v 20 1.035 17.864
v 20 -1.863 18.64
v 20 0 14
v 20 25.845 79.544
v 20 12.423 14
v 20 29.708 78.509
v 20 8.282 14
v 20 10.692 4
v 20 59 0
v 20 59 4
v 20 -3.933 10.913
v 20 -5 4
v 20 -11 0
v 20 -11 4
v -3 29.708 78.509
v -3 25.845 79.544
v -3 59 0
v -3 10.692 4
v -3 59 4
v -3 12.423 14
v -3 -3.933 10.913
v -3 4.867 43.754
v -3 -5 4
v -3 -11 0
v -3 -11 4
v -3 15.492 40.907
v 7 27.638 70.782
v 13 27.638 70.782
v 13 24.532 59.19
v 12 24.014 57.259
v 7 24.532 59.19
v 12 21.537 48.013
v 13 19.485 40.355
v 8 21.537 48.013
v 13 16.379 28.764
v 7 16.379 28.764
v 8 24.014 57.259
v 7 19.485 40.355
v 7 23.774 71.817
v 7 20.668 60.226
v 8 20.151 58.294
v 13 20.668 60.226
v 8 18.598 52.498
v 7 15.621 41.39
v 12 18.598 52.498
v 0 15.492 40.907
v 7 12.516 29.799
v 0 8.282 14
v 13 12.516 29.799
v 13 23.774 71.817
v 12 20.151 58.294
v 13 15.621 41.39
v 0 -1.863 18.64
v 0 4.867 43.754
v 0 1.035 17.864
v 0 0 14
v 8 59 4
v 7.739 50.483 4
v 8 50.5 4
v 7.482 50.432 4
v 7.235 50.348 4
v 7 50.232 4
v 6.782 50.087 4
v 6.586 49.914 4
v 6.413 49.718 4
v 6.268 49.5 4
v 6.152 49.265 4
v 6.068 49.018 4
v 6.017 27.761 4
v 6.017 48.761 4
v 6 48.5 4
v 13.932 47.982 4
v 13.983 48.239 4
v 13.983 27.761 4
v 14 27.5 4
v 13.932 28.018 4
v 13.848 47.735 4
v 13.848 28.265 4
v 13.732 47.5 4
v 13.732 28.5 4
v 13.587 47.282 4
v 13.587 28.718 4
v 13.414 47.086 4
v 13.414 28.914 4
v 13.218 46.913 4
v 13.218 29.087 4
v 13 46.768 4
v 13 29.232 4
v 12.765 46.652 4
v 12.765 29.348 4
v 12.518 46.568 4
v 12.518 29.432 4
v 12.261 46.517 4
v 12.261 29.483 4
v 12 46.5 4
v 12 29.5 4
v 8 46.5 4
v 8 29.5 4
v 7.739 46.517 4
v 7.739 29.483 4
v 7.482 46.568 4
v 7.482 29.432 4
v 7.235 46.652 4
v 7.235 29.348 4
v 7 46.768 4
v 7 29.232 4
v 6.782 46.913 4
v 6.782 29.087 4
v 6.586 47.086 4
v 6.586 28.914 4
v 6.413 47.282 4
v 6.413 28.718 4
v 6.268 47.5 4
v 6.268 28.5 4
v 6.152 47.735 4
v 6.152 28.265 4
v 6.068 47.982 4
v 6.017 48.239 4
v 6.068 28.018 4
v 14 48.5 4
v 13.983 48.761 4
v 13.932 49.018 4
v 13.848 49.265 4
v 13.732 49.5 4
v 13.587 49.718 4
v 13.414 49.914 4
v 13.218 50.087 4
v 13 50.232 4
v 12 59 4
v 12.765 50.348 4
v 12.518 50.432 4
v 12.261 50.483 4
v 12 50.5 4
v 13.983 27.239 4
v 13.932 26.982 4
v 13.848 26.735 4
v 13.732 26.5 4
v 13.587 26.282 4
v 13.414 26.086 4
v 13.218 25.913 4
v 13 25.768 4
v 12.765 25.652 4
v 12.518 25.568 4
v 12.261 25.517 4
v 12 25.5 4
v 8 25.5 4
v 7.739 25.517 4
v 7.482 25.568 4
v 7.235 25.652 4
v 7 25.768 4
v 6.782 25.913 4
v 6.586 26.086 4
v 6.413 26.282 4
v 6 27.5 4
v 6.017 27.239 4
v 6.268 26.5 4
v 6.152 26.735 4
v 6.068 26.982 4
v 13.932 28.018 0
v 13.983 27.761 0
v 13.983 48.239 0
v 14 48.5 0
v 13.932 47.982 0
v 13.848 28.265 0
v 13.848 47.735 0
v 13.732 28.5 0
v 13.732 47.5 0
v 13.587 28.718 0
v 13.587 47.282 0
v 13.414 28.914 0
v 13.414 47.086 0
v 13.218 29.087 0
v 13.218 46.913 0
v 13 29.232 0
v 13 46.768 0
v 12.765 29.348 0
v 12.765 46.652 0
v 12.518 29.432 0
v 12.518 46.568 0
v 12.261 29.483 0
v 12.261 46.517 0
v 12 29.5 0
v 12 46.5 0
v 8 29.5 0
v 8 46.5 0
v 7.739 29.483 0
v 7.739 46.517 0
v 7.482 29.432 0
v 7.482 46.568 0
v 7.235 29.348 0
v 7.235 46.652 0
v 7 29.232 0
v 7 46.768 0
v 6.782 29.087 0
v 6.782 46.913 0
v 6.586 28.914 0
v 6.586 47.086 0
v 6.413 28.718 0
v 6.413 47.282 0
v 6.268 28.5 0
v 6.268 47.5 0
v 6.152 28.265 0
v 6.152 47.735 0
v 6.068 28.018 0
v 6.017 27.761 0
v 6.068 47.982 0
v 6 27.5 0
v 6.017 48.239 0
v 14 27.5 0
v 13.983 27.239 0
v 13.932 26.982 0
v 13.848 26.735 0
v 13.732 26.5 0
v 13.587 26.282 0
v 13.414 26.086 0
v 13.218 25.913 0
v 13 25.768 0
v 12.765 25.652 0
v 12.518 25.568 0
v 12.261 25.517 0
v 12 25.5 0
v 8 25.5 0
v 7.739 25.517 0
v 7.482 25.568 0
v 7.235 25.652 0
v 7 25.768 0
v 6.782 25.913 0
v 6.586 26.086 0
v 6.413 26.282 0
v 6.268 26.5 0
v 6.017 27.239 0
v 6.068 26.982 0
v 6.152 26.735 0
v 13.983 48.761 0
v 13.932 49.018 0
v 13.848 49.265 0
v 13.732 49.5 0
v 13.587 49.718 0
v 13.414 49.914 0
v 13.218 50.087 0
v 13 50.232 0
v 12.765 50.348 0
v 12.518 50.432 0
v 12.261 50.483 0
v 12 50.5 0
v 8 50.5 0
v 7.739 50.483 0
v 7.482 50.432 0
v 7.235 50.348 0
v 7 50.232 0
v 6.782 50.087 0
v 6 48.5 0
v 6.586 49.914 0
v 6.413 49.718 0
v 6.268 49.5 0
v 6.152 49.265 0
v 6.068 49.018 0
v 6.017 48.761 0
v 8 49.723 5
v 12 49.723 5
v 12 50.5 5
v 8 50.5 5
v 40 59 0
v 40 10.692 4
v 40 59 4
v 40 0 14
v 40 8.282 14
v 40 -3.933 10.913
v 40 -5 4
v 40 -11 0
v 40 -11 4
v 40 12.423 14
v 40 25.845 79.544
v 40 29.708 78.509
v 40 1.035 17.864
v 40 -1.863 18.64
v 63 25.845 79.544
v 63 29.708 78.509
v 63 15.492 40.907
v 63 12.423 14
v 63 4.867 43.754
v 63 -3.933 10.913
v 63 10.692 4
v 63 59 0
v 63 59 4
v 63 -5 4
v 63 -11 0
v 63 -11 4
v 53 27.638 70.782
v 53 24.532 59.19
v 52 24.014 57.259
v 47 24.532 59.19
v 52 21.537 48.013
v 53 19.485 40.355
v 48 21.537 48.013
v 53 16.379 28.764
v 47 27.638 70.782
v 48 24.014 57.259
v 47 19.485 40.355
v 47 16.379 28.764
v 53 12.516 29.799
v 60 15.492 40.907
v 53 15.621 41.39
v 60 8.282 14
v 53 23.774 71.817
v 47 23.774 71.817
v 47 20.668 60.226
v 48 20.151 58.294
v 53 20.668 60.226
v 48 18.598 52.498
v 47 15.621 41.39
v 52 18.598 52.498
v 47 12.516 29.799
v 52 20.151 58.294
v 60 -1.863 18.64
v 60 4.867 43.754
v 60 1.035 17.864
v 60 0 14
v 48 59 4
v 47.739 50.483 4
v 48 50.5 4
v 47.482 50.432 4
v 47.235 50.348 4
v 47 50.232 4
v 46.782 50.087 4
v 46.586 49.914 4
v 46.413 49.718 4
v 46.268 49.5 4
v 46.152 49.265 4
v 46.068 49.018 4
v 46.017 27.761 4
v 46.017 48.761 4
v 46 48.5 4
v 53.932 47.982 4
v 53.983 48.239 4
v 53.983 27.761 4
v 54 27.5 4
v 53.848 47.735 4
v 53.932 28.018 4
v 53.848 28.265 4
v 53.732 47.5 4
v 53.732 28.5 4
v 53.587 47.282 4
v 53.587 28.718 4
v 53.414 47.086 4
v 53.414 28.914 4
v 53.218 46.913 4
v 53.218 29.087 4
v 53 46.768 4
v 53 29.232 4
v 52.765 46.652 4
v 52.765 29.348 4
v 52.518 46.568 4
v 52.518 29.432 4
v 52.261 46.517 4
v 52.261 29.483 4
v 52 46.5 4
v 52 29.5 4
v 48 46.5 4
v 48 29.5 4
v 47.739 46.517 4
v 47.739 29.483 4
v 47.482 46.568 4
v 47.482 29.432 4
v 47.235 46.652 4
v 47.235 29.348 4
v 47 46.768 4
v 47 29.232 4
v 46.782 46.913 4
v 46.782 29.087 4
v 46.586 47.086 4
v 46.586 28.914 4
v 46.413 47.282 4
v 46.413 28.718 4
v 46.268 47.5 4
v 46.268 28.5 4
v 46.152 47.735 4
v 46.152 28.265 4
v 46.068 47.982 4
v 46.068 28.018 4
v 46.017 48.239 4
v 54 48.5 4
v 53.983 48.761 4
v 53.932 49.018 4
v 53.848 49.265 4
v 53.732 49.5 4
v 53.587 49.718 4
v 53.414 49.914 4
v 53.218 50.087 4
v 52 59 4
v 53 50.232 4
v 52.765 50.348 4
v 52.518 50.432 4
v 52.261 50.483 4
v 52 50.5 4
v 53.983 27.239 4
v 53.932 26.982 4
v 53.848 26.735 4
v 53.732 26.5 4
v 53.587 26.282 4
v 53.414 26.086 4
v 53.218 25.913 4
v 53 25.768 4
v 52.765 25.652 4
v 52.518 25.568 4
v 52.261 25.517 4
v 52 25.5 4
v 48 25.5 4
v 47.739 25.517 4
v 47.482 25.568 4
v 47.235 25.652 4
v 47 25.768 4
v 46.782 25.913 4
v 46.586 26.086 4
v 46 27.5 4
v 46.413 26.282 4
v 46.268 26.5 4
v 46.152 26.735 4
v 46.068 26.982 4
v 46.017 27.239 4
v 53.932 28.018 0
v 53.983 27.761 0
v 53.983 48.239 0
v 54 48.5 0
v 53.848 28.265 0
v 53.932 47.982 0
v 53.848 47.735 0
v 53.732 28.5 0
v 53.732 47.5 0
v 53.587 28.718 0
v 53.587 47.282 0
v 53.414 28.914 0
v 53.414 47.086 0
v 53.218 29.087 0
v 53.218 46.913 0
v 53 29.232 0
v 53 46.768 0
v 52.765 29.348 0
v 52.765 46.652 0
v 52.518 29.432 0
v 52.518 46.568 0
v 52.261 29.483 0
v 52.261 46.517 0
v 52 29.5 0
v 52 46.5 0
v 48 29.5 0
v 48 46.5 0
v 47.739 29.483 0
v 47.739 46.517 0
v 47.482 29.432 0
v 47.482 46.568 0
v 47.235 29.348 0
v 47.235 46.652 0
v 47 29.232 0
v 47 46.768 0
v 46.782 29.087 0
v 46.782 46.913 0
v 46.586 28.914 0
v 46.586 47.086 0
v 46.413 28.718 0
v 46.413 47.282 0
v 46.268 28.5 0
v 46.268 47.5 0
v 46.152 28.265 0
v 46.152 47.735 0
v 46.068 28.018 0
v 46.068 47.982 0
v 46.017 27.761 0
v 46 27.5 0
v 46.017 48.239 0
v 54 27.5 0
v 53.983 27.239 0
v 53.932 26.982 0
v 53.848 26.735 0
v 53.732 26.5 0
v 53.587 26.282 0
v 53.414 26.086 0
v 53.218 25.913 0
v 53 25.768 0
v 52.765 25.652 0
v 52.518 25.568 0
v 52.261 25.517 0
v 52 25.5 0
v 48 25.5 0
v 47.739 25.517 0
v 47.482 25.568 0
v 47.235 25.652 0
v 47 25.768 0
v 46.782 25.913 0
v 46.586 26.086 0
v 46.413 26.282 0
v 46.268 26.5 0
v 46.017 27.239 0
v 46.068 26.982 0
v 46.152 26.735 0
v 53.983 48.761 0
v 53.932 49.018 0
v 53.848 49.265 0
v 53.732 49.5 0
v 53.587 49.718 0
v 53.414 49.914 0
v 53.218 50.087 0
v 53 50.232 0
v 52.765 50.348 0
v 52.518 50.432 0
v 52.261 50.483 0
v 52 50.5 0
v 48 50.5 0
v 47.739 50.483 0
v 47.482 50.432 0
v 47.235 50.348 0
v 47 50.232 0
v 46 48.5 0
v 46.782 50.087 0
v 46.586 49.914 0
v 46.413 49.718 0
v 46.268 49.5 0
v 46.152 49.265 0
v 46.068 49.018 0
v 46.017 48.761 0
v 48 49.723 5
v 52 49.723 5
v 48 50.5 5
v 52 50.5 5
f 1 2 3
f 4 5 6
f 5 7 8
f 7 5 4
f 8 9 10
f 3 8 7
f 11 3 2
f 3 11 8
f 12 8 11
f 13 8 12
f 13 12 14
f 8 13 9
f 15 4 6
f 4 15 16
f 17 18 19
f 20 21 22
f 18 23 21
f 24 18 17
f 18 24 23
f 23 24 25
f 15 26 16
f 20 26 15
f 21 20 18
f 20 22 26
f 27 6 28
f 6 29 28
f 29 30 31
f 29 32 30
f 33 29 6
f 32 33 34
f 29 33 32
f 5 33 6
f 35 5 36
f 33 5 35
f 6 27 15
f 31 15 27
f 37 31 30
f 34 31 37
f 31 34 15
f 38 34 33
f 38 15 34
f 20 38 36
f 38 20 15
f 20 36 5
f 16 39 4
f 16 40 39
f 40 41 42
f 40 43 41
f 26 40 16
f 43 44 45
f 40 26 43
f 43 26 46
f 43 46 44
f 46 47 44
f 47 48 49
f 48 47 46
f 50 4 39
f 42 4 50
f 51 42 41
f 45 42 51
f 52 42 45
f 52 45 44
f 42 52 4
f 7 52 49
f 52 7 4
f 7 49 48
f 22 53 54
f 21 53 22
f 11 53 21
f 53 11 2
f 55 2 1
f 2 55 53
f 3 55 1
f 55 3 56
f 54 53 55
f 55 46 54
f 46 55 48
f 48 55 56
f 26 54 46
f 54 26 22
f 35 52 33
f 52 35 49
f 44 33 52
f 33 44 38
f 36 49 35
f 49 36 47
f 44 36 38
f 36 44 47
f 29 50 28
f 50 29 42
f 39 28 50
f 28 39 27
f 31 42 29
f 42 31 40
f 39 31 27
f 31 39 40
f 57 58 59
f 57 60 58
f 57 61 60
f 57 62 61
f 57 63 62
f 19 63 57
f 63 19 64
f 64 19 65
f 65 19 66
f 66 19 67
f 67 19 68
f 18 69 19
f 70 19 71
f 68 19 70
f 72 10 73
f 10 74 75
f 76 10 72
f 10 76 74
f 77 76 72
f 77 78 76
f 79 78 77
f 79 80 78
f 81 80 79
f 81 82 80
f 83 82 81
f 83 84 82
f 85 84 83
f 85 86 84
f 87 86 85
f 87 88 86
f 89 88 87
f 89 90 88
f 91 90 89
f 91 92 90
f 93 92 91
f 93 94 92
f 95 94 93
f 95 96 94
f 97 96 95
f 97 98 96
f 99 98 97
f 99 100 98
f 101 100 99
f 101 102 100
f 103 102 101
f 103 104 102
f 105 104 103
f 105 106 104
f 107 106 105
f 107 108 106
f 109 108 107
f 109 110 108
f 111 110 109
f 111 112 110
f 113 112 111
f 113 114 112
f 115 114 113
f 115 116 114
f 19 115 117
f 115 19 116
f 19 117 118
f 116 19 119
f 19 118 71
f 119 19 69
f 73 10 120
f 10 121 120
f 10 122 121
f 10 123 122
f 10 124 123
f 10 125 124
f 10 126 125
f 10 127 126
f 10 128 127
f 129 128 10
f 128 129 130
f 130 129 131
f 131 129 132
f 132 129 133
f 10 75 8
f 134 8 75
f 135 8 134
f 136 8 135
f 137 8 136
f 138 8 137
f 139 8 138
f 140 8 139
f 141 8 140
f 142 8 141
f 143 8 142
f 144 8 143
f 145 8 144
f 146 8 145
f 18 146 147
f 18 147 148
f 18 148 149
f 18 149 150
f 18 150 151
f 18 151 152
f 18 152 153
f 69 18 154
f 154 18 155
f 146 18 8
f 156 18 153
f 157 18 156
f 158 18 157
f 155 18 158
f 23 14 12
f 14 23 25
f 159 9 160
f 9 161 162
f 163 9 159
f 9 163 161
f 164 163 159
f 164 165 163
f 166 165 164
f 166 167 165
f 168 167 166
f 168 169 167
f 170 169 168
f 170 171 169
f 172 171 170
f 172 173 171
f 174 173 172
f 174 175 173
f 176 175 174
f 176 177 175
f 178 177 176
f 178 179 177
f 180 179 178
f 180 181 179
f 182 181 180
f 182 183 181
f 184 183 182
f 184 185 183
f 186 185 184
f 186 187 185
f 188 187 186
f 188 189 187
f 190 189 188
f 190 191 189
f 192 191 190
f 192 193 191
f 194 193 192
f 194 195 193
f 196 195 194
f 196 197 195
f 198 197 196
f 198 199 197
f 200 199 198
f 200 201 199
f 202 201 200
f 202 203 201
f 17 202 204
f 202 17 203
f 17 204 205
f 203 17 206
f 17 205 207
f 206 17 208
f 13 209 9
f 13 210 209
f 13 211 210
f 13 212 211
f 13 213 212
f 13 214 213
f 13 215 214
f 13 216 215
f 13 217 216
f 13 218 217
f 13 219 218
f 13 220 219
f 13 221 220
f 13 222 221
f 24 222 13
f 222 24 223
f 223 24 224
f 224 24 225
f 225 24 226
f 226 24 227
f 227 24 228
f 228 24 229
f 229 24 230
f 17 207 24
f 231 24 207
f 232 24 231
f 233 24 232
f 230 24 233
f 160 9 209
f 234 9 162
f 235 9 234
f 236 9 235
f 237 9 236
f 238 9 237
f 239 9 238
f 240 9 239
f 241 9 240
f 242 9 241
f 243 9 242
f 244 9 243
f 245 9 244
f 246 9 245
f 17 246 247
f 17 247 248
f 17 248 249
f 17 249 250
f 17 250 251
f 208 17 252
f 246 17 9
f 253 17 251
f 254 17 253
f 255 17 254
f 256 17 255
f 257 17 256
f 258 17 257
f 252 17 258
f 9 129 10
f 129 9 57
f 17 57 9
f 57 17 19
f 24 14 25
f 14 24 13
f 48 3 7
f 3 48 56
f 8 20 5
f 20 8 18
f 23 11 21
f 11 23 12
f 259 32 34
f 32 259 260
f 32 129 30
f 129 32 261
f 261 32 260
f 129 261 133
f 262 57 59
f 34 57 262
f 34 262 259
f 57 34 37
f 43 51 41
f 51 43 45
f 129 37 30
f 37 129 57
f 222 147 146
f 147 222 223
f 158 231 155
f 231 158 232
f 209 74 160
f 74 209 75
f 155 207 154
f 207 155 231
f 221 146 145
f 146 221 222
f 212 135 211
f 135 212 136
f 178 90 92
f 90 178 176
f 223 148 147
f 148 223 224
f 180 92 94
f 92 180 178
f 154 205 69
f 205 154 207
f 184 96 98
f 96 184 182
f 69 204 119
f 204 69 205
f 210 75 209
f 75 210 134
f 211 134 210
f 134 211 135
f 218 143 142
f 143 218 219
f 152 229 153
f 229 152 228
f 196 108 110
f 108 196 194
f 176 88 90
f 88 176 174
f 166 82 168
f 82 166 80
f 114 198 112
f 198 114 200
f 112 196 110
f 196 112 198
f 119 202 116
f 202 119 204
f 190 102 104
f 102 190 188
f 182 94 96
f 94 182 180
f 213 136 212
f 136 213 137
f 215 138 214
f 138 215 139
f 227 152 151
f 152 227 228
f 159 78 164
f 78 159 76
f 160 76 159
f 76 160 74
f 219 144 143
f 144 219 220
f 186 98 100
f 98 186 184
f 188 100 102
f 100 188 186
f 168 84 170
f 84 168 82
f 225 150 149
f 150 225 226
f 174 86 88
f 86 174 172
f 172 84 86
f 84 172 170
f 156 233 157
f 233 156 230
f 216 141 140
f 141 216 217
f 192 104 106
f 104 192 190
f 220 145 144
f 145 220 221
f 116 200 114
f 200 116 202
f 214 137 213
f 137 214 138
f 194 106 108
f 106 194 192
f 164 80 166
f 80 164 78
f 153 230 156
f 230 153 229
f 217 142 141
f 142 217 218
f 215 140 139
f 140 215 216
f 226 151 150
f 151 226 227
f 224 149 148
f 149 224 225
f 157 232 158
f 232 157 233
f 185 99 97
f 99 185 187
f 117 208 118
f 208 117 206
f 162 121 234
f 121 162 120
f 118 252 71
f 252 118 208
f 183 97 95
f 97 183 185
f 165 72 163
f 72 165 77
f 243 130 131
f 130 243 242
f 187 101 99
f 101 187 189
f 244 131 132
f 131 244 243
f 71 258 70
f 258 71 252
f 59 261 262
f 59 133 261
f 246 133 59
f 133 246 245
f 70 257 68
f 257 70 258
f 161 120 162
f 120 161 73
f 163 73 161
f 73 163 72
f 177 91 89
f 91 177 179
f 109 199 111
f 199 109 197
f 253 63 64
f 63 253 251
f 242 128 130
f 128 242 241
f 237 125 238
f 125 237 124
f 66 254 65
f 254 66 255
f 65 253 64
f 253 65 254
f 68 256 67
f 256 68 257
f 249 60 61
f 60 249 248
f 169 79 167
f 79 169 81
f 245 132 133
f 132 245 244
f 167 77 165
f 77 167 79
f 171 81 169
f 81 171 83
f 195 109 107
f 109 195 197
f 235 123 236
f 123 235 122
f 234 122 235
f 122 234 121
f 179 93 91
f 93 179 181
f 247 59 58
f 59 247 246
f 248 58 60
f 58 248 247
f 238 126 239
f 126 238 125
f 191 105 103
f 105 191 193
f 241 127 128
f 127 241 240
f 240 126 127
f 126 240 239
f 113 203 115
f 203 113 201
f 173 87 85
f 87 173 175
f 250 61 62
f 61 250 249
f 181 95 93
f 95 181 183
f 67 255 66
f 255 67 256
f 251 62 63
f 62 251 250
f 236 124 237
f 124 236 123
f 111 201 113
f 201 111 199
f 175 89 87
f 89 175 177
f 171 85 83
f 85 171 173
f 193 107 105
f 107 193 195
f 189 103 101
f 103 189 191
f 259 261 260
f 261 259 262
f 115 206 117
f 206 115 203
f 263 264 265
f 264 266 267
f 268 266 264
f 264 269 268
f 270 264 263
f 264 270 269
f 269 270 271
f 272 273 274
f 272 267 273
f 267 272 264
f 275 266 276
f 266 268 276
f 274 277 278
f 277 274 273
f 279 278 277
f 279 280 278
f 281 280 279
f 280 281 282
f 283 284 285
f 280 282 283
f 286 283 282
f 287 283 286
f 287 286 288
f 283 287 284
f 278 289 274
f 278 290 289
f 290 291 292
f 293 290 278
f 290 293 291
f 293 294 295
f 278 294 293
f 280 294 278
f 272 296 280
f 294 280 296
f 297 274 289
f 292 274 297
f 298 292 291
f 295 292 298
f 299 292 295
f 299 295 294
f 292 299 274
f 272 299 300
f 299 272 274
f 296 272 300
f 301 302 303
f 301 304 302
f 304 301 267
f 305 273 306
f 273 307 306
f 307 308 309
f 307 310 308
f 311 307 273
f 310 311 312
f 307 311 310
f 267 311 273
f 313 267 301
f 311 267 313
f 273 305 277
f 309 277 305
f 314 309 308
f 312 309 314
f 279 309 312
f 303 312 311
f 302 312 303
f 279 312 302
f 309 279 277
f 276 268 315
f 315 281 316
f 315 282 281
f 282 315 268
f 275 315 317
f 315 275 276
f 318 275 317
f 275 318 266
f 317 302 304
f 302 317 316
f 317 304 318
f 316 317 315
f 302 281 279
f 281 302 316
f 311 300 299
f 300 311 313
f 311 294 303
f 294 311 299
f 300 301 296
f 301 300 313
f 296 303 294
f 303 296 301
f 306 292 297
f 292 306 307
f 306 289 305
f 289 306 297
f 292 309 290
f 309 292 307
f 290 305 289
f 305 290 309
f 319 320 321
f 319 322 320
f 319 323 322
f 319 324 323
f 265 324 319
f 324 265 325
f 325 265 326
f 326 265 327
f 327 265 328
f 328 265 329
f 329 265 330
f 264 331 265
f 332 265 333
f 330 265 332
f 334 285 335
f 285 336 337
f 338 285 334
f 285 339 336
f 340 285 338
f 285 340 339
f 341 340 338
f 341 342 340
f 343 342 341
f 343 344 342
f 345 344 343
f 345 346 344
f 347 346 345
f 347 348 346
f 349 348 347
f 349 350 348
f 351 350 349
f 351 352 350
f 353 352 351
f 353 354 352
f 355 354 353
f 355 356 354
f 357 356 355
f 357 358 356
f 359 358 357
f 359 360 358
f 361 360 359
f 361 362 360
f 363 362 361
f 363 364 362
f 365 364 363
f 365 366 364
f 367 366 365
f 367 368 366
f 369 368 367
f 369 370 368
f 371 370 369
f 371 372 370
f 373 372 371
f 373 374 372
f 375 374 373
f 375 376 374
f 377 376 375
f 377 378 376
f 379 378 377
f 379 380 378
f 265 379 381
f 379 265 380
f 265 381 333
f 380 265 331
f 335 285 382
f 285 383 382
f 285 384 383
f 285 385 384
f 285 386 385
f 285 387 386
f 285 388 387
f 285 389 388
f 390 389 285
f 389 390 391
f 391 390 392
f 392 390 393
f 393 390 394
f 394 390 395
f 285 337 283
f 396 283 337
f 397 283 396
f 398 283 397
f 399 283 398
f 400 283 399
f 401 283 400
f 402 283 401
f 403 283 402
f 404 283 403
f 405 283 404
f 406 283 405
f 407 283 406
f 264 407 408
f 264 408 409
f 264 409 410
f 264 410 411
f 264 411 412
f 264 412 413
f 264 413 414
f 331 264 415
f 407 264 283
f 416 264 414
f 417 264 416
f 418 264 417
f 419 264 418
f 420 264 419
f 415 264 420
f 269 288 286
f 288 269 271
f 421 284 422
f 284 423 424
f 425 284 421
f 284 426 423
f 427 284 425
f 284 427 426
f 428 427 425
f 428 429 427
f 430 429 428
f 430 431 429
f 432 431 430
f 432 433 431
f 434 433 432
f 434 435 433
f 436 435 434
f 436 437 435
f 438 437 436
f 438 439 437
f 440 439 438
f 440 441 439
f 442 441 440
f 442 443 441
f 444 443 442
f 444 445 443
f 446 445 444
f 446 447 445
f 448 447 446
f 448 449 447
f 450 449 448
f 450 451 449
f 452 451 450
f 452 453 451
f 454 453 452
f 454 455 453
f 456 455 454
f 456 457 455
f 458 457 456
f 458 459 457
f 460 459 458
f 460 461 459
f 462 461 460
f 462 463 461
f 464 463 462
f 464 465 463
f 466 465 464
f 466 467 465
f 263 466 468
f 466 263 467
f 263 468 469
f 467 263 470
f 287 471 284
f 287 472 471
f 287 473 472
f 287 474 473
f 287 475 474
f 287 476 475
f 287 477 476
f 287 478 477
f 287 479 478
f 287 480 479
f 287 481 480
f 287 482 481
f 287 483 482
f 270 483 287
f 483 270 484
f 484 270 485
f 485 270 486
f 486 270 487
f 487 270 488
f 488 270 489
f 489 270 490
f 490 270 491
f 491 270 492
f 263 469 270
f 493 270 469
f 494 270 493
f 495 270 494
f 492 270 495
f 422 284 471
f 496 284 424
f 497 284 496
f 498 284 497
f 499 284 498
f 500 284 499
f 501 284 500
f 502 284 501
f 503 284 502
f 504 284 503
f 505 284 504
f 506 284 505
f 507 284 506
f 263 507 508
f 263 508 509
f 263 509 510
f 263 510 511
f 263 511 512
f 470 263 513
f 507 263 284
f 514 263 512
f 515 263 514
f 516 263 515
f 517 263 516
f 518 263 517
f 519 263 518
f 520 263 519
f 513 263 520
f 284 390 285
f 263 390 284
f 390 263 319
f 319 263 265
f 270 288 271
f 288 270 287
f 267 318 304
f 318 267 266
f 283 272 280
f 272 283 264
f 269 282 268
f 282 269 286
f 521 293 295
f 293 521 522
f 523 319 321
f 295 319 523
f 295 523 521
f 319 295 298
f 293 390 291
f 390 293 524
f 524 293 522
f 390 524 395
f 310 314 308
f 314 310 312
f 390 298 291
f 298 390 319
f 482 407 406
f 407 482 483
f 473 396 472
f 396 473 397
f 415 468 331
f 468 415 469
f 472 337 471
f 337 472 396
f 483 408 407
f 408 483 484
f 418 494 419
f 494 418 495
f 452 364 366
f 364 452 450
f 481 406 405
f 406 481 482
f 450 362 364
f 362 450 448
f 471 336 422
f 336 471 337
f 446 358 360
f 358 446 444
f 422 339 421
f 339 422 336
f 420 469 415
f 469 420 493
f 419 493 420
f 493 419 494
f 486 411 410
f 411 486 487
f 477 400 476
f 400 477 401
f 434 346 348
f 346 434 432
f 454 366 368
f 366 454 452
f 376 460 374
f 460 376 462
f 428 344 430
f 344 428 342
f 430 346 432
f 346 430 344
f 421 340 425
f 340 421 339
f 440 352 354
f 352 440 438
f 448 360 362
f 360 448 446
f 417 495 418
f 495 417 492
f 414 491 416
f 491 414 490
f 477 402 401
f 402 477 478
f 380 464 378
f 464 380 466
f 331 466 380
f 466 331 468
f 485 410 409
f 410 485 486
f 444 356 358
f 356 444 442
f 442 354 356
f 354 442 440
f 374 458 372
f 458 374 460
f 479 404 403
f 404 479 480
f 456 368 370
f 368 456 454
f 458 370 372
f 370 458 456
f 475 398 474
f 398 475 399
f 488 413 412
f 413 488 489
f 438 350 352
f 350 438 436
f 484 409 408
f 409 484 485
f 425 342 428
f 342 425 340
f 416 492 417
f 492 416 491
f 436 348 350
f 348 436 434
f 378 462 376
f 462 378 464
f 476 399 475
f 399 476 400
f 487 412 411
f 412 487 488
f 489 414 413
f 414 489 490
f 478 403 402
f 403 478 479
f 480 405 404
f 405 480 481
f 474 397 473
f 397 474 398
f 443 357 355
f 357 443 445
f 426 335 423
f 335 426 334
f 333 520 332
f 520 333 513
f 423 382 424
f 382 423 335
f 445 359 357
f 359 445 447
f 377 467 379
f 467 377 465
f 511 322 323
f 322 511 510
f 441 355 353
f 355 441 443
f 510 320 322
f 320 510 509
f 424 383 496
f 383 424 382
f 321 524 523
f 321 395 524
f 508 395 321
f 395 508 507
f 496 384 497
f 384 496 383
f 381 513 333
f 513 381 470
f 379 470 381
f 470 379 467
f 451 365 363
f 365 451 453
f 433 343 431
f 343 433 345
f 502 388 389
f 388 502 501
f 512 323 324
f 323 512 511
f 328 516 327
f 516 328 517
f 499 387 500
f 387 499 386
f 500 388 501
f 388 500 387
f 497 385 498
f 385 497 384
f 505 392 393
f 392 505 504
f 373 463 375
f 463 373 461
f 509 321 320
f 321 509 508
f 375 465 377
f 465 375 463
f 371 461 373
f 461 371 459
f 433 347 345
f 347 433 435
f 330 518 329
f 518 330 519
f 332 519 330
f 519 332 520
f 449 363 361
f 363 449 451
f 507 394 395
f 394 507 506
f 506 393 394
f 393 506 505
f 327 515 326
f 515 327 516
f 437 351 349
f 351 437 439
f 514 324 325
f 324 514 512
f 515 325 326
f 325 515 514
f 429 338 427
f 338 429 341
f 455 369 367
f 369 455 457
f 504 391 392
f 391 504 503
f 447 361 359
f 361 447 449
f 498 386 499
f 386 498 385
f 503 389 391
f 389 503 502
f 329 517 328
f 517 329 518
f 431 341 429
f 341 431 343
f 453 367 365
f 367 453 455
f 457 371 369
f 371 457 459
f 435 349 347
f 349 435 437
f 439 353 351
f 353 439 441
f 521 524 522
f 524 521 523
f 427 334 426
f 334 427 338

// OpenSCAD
// file: common.scad
// common.scad - shared helpers for the Smart Campus Robot printed parts.
// NOTHING IN THIS DIRECTORY IS VERIFIED. No dimension has been measured.
// Mounting to the Rover 5 deck is by glue / double-sided tape / zip ties only.

$fn = 48;

// Global print/fit values (apply to every part that includes this file)
fit_clearance = 0.3;   // mm, added to pockets for a slip fit; guess (typical FDM) // VERIFY WITH CALIPERS (test print)
zip_w         = 4.0;   // mm, zip-tie slot width; guess for 3.6 mm ties          // VERIFY WITH CALIPERS
zip_h         = 2.0;   // mm, zip-tie slot height; guess for 1.1-1.5 mm ties     // VERIFY WITH CALIPERS
corner_r      = 2.0;   // mm, outer corner radius; cosmetic choice

// Rounded rectangle plate, origin at the centre of the bottom face.
module rounded_plate(x, y, h, r = corner_r) {
    rr = min(r, x / 2 - 0.01, y / 2 - 0.01);
    translate([-x / 2 + rr, -y / 2 + rr, 0])
        linear_extrude(h)
            offset(r = rr) square([x - 2 * rr, y - 2 * rr]);
}

// Through-slot for a zip tie / strap, centred at origin, long axis along X.
module strap_slot(len, wid, h) {
    translate([0, 0, -1])
        linear_extrude(h + 2)
            hull() {
                translate([-(len - wid) / 2, 0]) circle(d = wid);
                translate([ (len - wid) / 2, 0]) circle(d = wid);
            }
}

// Pair of zip-tie slots, spaced `pitch` apart along Y, cut through height h.
module zip_pair(pitch, h) {
    for (s = [-1, 1])
        translate([0, s * pitch / 2, 0]) strap_slot(zip_w * 2, zip_h * 2, h);
}

// Simple round standoff with a hole (for self-tapping or heat-set insert).
module standoff(od, id, h) {
    difference() {
        cylinder(d = od, h = h);
        translate([0, 0, -1]) cylinder(d = id, h = h + 2);
    }
}
// main file
// display_bracket.scad - tilted stand for the Waveshare 7" HDMI LCD (C), 1024x600.
// Two small corner stands (left + right, mirror images) instead of one 170 mm
// wide part, so they fit any printer bed. Each stand: a foot, a back rest
// tilted back by tilt_deg, a bottom ledge with a front lip, and a side hook.
// The panel sits on the two ledges and leans on the two rests; a zip tie or a
// velcro strap through the rest slots holds it.
// NOTHING HERE IS VERIFIED. Every dimension below is nominal or a guess.
// The panel's own mounting holes are NOT used (their positions are not
// confirmed). Mounting to the Rover 5 deck: glue / double-sided tape under the
// feet, or zip ties through the foot slots. No deck drilling.
// Check where the panel's HDMI / USB connectors exit before choosing
// stand_inset: the stands must not cover them.
//
// part = "both" (print layout), "left" or "right"
include <common.scad>

part = "both";

// ---- Panel (nominal: Waveshare wiki "7inch HDMI LCD (C)" dimension drawing) ----
panel_w      = 164.9;  // mm, outline width; Waveshare 7inch HDMI LCD (C) drawing  // VERIFY WITH CALIPERS
panel_h      = 100.0;  // mm, outline height; Waveshare 7inch HDMI LCD (C) drawing // VERIFY WITH CALIPERS
panel_t      = 8.0;    // mm, thickest point at the edges (glass+PCB); guess      // VERIFY WITH CALIPERS
bezel_clear  = 4.0;    // mm, lip may cover this much of the bottom bezel; guess  // VERIFY WITH CALIPERS

// ---- Stand ----
tilt_deg     = 15;     // deg back from vertical; guess for a standing visitor   (adjust after a try-out)
stand_w      = 20.0;   // mm, width of each stand along the panel edge; guess     // VERIFY WITH CALIPERS
stand_inset  = 0.0;    // mm, stand outer face in from the panel corner; guess    // VERIFY WITH CALIPERS
rest_t       = 4.0;    // mm, back rest thickness; guess                         // VERIFY WITH CALIPERS
rest_l       = 70.0;   // mm, back rest length (fraction of panel_h); guess      // VERIFY WITH CALIPERS
ledge_t      = 4.0;    // mm, ledge thickness under the panel; guess             // VERIFY WITH CALIPERS
lip_t        = 3.0;    // mm, front lip thickness; guess                         // VERIFY WITH CALIPERS
ledge_z      = 10.0;   // mm, panel bottom edge above the deck; guess            // VERIFY WITH CALIPERS
hook_t       = 3.0;    // mm, side hook thickness; guess                         // VERIFY WITH CALIPERS
hook_h       = 30.0;   // mm, side hook height; guess                            // VERIFY WITH CALIPERS
foot_d       = 70.0;   // mm, foot depth (front-back, glue area); guess          // VERIFY WITH CALIPERS
foot_t       = 4.0;    // mm; guess                                              // VERIFY WITH CALIPERS
strap_len    = 12.0;   // mm, slot for a zip tie / 10 mm velcro; guess           // VERIFY WITH CALIPERS

// Stand in the "panel frame": panel front face is the plane y = 0, panel bottom
// edge at z = 0, panel occupies y in [0, panel_t]. X is along the panel edge,
// the outer (corner) side of the stand is at x = 0, the stand spans x in [0, w].
module stand_panel_frame(w) {
    total_w = w + hook_t;
    difference() {
        union() {
            // back rest behind the panel
            translate([-hook_t, panel_t, -ledge_t]) cube([total_w, rest_t, rest_l + ledge_t]);
            // ledge under the panel
            translate([-hook_t, -lip_t, -ledge_t]) cube([total_w, panel_t + rest_t + lip_t, ledge_t]);
            // front lip (stays within the bottom bezel)
            translate([-hook_t, -lip_t, 0]) cube([total_w, lip_t, bezel_clear]);
            // side hook at the outer corner
            translate([-hook_t, -lip_t, 0]) cube([hook_t, panel_t + lip_t, hook_h]);
        }
        // strap slots through the back rest
        for (z = [rest_l * 0.35, rest_l * 0.8])
            translate([w / 2, panel_t + rest_t / 2, z])
                cube([zip_w * 1.5, rest_t + 2, strap_len], center = true);
    }
}

// Tilted and lifted onto the foot. Tilt: top of the panel moves toward +Y.
module tilted(w) {
    translate([0, 0, foot_t + ledge_z]) rotate([-tilt_deg, 0, 0]) stand_panel_frame(w);
}

module stand(w) {
    // y of the front of the ledge after tilting is about -lip_t; foot starts there
    foot_y0 = -lip_t - 8;
    difference() {
        union() {
            tilted(w);
            // foot
            translate([-hook_t, foot_y0, 0]) cube([w + hook_t, foot_d, foot_t]);
            // fill under the tilted ledge
            hull() {
                translate([-hook_t, foot_y0 + 6, 0]) cube([w + hook_t, panel_t + rest_t + lip_t, foot_t]);
                intersection() {
                    tilted(w);
                    translate([-50, -50, 0]) cube([200, 200, foot_t + ledge_z]);
                }
            }
            // diagonal brace from the foot's back end to the rest
            hull() {
                translate([w / 2 - 2, foot_y0 + foot_d - 6, 0]) cube([4, 6, foot_t]);
                translate([0, 0, foot_t + ledge_z]) rotate([-tilt_deg, 0, 0])
                    translate([w / 2 - 2, panel_t, rest_l * 0.6]) cube([4, rest_t, 6]);
            }
        }
        // foot zip-tie slots
        for (yy = [foot_d * 0.55, foot_d * 0.85])
            translate([w / 2, foot_y0 + yy, 0]) strap_slot(zip_w * 2, zip_h * 2, foot_t);
        // flatten the bottom
        translate([-100, -100, -50]) cube([300, 300, 50]);
    }
}

echo(str("panel top above deck (approx) = ",
         foot_t + ledge_z + panel_h * cos(tilt_deg), " mm"));
echo(str("stand centres along the panel edge = ",
         panel_w - 2 * stand_inset - stand_w, " mm apart"));

if (part == "left"  || part == "both") stand(stand_w);
if (part == "right" || part == "both")
    translate([2 * stand_w + 20, 0, 0]) mirror([1, 0, 0]) stand(stand_w);
